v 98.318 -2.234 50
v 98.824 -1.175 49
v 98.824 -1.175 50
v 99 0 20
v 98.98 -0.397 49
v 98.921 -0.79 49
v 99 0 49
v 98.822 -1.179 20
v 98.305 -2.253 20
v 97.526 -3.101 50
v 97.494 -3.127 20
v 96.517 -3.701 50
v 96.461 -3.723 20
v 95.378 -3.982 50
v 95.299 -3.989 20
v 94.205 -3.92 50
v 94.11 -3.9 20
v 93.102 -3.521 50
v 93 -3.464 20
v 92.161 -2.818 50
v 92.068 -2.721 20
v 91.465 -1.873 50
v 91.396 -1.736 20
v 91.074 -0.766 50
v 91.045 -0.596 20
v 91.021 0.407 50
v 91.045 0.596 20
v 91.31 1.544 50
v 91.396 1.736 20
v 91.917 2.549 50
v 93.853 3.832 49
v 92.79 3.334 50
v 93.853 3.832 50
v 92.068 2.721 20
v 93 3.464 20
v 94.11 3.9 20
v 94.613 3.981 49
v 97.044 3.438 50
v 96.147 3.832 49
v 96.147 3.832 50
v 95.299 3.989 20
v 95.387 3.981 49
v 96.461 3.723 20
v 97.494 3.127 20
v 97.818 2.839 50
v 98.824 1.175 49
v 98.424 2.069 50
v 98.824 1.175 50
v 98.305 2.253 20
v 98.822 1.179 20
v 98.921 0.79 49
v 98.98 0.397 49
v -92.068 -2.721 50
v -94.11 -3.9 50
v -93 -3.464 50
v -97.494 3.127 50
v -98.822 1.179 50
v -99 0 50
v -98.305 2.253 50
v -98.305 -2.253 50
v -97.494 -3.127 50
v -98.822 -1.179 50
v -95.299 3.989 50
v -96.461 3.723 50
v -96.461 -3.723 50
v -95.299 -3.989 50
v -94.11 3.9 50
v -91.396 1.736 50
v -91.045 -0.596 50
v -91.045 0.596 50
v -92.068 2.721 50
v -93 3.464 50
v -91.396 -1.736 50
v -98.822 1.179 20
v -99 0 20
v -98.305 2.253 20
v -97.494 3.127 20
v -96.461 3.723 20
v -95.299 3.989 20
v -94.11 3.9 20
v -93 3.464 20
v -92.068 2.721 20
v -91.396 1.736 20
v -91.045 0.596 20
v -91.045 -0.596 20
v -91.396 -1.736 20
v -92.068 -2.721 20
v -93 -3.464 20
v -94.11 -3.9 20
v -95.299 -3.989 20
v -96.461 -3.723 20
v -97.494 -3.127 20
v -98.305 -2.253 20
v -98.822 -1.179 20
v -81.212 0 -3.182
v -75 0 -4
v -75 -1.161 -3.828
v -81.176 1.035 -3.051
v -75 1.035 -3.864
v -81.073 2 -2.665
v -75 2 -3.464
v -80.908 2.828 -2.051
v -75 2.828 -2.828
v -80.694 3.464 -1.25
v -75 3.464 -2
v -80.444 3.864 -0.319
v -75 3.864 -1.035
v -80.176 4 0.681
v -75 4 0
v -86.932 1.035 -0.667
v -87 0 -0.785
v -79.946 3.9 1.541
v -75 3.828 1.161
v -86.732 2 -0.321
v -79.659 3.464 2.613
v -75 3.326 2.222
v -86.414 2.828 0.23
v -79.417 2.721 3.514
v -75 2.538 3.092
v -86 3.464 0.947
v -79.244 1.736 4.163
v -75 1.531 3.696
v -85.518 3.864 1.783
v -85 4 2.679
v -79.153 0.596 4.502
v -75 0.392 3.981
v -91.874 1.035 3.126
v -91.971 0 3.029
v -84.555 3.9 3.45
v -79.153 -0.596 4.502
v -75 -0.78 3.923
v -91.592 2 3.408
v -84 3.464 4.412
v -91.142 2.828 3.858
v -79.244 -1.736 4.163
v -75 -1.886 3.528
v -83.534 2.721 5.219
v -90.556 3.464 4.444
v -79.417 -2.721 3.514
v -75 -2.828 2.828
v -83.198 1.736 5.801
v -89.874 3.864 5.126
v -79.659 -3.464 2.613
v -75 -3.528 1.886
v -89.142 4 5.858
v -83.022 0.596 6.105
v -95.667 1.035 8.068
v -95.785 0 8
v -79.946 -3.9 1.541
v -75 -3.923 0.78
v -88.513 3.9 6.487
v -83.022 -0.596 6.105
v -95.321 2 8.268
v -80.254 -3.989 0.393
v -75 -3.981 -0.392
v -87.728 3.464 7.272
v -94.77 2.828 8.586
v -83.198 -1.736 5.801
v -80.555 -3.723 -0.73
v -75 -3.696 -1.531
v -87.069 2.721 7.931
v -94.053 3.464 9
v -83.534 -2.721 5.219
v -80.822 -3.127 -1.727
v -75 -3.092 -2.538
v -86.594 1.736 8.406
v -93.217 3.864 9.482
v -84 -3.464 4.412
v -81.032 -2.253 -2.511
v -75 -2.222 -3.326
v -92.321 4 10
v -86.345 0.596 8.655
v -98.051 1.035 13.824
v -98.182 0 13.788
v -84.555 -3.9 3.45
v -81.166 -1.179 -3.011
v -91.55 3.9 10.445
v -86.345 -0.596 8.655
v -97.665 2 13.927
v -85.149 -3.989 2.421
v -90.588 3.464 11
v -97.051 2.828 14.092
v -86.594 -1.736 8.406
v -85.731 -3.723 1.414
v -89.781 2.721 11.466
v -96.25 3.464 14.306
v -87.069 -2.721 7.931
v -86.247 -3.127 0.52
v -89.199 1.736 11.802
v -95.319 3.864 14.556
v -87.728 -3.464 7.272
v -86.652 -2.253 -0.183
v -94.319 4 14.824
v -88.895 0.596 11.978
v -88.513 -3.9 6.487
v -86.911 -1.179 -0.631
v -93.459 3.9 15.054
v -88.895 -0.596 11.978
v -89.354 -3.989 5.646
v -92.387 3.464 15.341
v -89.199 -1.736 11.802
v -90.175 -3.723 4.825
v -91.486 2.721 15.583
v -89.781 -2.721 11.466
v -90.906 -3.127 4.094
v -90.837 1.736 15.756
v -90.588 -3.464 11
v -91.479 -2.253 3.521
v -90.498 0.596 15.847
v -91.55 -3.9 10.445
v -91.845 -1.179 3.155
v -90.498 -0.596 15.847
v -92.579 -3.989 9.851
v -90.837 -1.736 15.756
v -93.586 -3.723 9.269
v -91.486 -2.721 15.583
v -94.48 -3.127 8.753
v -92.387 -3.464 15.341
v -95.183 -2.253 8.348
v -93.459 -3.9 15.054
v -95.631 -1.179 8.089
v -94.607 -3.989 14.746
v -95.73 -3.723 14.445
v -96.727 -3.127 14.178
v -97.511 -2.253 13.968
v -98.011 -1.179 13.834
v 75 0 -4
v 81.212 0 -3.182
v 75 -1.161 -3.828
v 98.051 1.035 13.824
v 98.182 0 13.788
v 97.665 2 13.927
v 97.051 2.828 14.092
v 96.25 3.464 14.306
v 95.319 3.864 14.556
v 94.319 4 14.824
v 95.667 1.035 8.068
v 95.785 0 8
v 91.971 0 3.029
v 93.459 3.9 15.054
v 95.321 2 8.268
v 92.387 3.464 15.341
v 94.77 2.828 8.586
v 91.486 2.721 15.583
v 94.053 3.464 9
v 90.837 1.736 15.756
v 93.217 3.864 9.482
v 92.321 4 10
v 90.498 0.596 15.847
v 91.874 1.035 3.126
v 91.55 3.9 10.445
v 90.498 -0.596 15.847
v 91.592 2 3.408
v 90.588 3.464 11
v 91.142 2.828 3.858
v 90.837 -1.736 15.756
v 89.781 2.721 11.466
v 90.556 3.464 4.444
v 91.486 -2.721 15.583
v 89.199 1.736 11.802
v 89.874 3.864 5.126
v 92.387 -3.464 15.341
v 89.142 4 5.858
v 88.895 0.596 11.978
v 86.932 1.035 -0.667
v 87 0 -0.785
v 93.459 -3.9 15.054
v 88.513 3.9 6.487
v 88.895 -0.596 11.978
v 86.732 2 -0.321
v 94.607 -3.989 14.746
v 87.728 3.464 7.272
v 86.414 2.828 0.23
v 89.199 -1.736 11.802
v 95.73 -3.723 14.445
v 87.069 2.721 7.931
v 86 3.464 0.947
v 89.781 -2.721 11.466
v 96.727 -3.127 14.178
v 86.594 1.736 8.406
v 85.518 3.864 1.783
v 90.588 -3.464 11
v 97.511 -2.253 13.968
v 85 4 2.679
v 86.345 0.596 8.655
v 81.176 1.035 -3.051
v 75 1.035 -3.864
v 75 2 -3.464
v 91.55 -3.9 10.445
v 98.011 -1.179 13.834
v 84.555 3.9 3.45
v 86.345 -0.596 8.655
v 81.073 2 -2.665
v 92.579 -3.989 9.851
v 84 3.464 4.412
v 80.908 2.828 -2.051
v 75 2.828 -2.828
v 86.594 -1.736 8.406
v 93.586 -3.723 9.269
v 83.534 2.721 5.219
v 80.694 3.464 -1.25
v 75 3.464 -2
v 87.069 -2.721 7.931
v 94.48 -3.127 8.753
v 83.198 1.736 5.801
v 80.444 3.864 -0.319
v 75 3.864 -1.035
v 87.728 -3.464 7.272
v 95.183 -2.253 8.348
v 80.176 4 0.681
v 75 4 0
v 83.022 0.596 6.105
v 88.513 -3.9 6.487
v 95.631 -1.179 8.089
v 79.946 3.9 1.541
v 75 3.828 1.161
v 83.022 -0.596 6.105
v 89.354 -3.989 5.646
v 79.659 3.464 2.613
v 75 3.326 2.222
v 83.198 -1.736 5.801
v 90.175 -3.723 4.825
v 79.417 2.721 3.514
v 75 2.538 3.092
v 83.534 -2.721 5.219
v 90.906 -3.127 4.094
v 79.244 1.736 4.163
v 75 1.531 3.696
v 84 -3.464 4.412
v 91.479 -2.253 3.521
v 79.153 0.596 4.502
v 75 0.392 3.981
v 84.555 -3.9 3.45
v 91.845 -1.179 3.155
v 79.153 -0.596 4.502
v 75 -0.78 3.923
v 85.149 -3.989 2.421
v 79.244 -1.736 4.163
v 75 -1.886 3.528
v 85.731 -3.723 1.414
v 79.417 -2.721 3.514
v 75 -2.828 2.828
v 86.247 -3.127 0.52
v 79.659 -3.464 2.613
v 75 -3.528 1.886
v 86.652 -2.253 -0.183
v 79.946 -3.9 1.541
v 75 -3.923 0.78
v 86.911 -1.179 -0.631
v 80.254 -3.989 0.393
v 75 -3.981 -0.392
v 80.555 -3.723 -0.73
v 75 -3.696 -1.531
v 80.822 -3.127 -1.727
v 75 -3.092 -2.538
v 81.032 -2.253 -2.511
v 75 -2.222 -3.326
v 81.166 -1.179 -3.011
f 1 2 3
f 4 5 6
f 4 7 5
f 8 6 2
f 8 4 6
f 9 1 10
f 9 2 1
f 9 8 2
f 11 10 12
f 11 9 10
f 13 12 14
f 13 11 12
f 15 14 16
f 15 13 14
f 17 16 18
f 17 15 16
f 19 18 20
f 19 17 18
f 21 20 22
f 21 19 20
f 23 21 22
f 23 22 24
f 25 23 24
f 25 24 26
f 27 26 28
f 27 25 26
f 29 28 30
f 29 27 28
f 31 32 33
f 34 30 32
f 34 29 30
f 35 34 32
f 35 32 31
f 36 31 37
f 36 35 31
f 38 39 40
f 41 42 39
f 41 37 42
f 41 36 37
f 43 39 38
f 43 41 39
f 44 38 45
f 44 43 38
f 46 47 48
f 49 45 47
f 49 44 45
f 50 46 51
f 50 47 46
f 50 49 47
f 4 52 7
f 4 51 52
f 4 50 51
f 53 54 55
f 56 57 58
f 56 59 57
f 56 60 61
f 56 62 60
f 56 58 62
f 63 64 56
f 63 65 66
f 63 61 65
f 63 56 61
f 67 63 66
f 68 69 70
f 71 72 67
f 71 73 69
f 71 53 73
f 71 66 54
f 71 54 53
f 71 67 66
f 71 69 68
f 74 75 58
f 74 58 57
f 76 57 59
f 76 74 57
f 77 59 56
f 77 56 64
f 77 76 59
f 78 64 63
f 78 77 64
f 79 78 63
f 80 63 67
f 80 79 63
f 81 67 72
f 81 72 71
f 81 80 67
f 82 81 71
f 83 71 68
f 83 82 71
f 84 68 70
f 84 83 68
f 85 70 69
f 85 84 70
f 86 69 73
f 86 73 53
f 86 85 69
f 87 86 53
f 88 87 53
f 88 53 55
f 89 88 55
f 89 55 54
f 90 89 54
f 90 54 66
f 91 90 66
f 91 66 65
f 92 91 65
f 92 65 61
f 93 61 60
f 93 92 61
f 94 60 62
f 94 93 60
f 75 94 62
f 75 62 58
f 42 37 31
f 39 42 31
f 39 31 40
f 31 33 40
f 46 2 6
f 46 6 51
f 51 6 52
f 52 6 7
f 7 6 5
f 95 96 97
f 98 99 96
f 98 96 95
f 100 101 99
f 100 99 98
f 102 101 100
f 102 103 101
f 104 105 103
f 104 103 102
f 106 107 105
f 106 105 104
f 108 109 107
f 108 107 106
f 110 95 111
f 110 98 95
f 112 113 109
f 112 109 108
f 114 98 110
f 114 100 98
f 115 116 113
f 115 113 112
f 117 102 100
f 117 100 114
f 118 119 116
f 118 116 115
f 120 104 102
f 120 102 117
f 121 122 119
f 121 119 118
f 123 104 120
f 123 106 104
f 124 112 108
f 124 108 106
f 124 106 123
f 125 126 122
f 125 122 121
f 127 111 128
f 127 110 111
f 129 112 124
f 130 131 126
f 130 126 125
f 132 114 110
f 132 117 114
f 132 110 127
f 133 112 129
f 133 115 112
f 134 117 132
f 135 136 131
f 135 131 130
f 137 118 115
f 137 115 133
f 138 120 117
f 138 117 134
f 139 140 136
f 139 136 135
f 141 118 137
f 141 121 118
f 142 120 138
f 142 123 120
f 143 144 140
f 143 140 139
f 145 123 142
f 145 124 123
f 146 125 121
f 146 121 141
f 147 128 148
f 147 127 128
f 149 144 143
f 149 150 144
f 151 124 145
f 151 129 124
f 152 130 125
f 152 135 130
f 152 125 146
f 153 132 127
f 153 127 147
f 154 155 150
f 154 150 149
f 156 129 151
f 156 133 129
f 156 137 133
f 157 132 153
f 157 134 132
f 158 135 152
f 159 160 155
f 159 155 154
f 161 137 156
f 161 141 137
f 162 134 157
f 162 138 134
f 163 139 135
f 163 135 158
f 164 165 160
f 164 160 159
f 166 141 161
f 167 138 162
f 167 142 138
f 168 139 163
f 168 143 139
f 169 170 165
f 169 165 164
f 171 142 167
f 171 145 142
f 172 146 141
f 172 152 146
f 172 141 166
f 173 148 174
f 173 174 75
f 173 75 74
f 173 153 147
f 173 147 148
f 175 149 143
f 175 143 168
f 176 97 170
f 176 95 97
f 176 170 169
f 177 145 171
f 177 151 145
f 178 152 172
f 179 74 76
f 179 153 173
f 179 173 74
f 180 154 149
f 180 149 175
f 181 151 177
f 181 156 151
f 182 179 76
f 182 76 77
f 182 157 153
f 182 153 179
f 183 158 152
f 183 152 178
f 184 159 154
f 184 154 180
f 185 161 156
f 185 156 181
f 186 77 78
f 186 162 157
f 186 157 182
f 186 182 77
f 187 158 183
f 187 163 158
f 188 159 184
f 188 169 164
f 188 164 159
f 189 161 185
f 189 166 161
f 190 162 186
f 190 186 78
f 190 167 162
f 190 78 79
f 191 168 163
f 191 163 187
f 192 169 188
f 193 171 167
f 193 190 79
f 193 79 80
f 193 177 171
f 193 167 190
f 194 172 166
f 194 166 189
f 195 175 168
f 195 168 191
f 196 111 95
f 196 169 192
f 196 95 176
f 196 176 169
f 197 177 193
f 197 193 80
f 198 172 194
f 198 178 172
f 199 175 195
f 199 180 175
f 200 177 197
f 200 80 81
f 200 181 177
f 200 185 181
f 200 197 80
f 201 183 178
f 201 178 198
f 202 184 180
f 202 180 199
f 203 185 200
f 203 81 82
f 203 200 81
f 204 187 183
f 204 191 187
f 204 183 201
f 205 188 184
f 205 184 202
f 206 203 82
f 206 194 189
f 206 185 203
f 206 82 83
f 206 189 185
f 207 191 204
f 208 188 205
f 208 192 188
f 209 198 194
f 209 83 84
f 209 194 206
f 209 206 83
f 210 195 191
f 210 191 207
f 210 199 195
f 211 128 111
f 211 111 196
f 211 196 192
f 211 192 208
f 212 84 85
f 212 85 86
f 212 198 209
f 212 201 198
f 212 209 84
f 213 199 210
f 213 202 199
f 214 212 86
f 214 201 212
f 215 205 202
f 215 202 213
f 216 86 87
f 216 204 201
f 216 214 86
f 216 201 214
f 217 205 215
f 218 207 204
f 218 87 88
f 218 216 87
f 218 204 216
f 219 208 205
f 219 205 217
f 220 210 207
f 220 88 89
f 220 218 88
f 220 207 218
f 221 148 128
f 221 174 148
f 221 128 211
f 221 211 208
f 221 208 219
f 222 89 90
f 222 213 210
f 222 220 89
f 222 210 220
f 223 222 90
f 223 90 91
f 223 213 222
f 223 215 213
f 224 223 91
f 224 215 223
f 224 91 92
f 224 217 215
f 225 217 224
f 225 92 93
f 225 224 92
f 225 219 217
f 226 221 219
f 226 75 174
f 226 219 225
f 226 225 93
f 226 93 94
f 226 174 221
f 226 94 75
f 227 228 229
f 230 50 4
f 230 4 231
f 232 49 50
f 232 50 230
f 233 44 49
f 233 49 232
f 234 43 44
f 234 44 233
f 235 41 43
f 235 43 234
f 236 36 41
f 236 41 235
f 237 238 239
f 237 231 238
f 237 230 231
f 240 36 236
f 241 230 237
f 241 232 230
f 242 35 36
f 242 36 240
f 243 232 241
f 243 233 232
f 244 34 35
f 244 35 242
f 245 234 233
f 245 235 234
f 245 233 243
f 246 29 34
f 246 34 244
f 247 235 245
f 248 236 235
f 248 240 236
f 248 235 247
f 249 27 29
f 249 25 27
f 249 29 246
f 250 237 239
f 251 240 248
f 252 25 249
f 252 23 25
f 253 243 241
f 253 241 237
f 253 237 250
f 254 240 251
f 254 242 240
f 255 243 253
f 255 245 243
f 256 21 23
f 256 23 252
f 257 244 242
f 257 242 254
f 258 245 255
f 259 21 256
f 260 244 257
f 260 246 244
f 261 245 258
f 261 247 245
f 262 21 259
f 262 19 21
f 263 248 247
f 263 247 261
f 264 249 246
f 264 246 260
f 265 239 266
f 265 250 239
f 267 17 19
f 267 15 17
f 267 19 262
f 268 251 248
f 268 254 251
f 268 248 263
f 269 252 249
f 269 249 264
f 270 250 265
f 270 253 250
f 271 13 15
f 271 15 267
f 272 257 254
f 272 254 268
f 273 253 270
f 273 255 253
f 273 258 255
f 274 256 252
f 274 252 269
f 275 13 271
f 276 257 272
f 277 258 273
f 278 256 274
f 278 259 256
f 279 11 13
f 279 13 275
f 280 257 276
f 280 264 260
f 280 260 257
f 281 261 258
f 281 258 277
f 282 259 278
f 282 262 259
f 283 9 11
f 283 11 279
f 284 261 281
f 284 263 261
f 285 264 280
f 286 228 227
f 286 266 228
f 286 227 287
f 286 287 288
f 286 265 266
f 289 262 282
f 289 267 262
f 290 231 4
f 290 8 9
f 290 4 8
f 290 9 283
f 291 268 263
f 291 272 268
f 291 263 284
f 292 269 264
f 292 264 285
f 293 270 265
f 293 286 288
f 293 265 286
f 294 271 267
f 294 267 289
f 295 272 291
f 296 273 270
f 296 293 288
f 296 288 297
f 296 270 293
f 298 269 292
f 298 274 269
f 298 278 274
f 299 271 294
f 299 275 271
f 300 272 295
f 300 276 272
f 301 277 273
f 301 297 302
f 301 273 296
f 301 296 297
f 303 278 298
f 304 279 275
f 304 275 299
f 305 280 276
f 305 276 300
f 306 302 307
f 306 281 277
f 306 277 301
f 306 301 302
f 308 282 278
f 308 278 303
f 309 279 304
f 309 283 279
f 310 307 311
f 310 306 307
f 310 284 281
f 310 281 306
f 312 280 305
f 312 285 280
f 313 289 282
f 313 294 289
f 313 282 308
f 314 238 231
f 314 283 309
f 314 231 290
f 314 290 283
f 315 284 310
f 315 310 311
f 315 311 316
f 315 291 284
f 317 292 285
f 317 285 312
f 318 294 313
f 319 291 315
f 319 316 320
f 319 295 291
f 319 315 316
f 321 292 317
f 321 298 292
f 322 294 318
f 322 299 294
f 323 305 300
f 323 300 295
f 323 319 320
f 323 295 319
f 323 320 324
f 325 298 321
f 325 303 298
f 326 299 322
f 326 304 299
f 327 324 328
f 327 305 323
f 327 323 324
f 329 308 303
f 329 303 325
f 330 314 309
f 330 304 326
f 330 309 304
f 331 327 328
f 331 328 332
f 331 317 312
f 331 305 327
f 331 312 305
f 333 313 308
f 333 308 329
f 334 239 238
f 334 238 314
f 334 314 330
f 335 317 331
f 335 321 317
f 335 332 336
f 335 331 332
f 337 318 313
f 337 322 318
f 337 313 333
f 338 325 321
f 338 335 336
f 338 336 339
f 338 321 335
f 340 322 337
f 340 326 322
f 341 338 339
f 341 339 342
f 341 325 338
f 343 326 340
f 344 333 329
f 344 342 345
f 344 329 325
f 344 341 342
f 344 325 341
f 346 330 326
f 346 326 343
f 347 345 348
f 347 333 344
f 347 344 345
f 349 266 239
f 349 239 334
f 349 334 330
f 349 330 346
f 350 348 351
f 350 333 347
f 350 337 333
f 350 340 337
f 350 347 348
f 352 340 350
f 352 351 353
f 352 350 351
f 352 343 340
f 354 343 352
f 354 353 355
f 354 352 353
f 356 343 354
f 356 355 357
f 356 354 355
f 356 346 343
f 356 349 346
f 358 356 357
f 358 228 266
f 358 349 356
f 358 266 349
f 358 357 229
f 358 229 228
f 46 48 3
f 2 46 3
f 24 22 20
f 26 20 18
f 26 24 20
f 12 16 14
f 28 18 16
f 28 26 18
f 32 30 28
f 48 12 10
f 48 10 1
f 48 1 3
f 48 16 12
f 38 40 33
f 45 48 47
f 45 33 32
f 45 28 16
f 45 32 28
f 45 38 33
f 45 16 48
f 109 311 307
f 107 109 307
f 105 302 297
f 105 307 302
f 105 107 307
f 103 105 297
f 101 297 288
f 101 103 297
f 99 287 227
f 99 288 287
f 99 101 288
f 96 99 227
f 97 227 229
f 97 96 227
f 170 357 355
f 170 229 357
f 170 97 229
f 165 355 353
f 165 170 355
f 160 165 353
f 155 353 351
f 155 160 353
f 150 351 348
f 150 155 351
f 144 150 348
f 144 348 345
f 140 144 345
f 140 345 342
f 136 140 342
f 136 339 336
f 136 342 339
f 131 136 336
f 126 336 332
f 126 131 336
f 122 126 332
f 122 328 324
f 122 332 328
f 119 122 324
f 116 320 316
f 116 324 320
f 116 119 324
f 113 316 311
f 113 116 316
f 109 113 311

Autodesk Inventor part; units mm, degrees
ref_plane "YZ Plane" through (0, 0, 0) normal (1, 0, 0) x (0, 1, 0)
ref_plane "XZ Plane" through (0, 0, 0) normal (0, 1, 0) x (-1, 0, 0)
ref_plane "XY Plane" through (0, 0, 0) normal (0, 0, 1) x (1, 0, 0)
sketch "Sketch1" plane through (0, 0, 0) normal (1, 0, 0) x (0, 1, 0)
  circle A0 centre (0, 0) radius 4
  dimension "d0" = 8
extrude "Extrusion1" add sketch "Sketch1" along normal mid plane 150
sketch "Sketch4" plane through (75, 0, 0) normal (1, 0, 0) x (0, 0, -1)
  circle A0 centre (0, 0) radius 4
  line L0 (-20, 15.4363) -> (-20, -7.2727)
  circle A1 centre (0, 0) radius 4 projected
  dimension "d10" = 20
  dimension "d11" = 0
revolve "Revolution1" add sketch "Sketch4" angle 90 about axis through (75, 15.4363, 20) along (0, -1, 0)
mirror "Mirror1" about plane through (0, 0, 0) normal (1, 0, 0) of "Revolution1"
sketch "Sketch5" plane through (95, 0, 20) normal (0, 0, 1) x (1, 0, 0)
  circle A0 centre (0, 0) radius 4 projected
  point P0 (-95, 0)
extrude "Extrusion3" add sketch "Sketch5" along normal blind 30
mirror "Mirror2" about plane through (0, 0, 0) normal (1, 0, 0) of "Extrusion3"
sketch "Sketch6" plane through (95, 0, 50) normal (0, 0, 1) x (1, 0, 0)
  circle A0 centre (0, 0) radius 4 projected
  line L0 (-1.147, 3.832) -> (3.8236, 3.832)
  line L1 (3.8236, 3.832) -> (3.8236, -1.1749)
  line L2 (3.8236, -1.1749) -> (-1.147, -1.1749)
  line L3 (-1.147, -1.1749) -> (-1.147, 3.832)
  circle A1 centre (0, 0) radius 4 projected
  point P0 (-95, 0)
  point P1 (3.8236, 1.1749)
  point P2 (1.147, 3.832)
extrude "Extrusion4" cut sketch "Sketch6" against normal blind 1 contours A0 L0 | L1 A0
properties part number "Handle"
